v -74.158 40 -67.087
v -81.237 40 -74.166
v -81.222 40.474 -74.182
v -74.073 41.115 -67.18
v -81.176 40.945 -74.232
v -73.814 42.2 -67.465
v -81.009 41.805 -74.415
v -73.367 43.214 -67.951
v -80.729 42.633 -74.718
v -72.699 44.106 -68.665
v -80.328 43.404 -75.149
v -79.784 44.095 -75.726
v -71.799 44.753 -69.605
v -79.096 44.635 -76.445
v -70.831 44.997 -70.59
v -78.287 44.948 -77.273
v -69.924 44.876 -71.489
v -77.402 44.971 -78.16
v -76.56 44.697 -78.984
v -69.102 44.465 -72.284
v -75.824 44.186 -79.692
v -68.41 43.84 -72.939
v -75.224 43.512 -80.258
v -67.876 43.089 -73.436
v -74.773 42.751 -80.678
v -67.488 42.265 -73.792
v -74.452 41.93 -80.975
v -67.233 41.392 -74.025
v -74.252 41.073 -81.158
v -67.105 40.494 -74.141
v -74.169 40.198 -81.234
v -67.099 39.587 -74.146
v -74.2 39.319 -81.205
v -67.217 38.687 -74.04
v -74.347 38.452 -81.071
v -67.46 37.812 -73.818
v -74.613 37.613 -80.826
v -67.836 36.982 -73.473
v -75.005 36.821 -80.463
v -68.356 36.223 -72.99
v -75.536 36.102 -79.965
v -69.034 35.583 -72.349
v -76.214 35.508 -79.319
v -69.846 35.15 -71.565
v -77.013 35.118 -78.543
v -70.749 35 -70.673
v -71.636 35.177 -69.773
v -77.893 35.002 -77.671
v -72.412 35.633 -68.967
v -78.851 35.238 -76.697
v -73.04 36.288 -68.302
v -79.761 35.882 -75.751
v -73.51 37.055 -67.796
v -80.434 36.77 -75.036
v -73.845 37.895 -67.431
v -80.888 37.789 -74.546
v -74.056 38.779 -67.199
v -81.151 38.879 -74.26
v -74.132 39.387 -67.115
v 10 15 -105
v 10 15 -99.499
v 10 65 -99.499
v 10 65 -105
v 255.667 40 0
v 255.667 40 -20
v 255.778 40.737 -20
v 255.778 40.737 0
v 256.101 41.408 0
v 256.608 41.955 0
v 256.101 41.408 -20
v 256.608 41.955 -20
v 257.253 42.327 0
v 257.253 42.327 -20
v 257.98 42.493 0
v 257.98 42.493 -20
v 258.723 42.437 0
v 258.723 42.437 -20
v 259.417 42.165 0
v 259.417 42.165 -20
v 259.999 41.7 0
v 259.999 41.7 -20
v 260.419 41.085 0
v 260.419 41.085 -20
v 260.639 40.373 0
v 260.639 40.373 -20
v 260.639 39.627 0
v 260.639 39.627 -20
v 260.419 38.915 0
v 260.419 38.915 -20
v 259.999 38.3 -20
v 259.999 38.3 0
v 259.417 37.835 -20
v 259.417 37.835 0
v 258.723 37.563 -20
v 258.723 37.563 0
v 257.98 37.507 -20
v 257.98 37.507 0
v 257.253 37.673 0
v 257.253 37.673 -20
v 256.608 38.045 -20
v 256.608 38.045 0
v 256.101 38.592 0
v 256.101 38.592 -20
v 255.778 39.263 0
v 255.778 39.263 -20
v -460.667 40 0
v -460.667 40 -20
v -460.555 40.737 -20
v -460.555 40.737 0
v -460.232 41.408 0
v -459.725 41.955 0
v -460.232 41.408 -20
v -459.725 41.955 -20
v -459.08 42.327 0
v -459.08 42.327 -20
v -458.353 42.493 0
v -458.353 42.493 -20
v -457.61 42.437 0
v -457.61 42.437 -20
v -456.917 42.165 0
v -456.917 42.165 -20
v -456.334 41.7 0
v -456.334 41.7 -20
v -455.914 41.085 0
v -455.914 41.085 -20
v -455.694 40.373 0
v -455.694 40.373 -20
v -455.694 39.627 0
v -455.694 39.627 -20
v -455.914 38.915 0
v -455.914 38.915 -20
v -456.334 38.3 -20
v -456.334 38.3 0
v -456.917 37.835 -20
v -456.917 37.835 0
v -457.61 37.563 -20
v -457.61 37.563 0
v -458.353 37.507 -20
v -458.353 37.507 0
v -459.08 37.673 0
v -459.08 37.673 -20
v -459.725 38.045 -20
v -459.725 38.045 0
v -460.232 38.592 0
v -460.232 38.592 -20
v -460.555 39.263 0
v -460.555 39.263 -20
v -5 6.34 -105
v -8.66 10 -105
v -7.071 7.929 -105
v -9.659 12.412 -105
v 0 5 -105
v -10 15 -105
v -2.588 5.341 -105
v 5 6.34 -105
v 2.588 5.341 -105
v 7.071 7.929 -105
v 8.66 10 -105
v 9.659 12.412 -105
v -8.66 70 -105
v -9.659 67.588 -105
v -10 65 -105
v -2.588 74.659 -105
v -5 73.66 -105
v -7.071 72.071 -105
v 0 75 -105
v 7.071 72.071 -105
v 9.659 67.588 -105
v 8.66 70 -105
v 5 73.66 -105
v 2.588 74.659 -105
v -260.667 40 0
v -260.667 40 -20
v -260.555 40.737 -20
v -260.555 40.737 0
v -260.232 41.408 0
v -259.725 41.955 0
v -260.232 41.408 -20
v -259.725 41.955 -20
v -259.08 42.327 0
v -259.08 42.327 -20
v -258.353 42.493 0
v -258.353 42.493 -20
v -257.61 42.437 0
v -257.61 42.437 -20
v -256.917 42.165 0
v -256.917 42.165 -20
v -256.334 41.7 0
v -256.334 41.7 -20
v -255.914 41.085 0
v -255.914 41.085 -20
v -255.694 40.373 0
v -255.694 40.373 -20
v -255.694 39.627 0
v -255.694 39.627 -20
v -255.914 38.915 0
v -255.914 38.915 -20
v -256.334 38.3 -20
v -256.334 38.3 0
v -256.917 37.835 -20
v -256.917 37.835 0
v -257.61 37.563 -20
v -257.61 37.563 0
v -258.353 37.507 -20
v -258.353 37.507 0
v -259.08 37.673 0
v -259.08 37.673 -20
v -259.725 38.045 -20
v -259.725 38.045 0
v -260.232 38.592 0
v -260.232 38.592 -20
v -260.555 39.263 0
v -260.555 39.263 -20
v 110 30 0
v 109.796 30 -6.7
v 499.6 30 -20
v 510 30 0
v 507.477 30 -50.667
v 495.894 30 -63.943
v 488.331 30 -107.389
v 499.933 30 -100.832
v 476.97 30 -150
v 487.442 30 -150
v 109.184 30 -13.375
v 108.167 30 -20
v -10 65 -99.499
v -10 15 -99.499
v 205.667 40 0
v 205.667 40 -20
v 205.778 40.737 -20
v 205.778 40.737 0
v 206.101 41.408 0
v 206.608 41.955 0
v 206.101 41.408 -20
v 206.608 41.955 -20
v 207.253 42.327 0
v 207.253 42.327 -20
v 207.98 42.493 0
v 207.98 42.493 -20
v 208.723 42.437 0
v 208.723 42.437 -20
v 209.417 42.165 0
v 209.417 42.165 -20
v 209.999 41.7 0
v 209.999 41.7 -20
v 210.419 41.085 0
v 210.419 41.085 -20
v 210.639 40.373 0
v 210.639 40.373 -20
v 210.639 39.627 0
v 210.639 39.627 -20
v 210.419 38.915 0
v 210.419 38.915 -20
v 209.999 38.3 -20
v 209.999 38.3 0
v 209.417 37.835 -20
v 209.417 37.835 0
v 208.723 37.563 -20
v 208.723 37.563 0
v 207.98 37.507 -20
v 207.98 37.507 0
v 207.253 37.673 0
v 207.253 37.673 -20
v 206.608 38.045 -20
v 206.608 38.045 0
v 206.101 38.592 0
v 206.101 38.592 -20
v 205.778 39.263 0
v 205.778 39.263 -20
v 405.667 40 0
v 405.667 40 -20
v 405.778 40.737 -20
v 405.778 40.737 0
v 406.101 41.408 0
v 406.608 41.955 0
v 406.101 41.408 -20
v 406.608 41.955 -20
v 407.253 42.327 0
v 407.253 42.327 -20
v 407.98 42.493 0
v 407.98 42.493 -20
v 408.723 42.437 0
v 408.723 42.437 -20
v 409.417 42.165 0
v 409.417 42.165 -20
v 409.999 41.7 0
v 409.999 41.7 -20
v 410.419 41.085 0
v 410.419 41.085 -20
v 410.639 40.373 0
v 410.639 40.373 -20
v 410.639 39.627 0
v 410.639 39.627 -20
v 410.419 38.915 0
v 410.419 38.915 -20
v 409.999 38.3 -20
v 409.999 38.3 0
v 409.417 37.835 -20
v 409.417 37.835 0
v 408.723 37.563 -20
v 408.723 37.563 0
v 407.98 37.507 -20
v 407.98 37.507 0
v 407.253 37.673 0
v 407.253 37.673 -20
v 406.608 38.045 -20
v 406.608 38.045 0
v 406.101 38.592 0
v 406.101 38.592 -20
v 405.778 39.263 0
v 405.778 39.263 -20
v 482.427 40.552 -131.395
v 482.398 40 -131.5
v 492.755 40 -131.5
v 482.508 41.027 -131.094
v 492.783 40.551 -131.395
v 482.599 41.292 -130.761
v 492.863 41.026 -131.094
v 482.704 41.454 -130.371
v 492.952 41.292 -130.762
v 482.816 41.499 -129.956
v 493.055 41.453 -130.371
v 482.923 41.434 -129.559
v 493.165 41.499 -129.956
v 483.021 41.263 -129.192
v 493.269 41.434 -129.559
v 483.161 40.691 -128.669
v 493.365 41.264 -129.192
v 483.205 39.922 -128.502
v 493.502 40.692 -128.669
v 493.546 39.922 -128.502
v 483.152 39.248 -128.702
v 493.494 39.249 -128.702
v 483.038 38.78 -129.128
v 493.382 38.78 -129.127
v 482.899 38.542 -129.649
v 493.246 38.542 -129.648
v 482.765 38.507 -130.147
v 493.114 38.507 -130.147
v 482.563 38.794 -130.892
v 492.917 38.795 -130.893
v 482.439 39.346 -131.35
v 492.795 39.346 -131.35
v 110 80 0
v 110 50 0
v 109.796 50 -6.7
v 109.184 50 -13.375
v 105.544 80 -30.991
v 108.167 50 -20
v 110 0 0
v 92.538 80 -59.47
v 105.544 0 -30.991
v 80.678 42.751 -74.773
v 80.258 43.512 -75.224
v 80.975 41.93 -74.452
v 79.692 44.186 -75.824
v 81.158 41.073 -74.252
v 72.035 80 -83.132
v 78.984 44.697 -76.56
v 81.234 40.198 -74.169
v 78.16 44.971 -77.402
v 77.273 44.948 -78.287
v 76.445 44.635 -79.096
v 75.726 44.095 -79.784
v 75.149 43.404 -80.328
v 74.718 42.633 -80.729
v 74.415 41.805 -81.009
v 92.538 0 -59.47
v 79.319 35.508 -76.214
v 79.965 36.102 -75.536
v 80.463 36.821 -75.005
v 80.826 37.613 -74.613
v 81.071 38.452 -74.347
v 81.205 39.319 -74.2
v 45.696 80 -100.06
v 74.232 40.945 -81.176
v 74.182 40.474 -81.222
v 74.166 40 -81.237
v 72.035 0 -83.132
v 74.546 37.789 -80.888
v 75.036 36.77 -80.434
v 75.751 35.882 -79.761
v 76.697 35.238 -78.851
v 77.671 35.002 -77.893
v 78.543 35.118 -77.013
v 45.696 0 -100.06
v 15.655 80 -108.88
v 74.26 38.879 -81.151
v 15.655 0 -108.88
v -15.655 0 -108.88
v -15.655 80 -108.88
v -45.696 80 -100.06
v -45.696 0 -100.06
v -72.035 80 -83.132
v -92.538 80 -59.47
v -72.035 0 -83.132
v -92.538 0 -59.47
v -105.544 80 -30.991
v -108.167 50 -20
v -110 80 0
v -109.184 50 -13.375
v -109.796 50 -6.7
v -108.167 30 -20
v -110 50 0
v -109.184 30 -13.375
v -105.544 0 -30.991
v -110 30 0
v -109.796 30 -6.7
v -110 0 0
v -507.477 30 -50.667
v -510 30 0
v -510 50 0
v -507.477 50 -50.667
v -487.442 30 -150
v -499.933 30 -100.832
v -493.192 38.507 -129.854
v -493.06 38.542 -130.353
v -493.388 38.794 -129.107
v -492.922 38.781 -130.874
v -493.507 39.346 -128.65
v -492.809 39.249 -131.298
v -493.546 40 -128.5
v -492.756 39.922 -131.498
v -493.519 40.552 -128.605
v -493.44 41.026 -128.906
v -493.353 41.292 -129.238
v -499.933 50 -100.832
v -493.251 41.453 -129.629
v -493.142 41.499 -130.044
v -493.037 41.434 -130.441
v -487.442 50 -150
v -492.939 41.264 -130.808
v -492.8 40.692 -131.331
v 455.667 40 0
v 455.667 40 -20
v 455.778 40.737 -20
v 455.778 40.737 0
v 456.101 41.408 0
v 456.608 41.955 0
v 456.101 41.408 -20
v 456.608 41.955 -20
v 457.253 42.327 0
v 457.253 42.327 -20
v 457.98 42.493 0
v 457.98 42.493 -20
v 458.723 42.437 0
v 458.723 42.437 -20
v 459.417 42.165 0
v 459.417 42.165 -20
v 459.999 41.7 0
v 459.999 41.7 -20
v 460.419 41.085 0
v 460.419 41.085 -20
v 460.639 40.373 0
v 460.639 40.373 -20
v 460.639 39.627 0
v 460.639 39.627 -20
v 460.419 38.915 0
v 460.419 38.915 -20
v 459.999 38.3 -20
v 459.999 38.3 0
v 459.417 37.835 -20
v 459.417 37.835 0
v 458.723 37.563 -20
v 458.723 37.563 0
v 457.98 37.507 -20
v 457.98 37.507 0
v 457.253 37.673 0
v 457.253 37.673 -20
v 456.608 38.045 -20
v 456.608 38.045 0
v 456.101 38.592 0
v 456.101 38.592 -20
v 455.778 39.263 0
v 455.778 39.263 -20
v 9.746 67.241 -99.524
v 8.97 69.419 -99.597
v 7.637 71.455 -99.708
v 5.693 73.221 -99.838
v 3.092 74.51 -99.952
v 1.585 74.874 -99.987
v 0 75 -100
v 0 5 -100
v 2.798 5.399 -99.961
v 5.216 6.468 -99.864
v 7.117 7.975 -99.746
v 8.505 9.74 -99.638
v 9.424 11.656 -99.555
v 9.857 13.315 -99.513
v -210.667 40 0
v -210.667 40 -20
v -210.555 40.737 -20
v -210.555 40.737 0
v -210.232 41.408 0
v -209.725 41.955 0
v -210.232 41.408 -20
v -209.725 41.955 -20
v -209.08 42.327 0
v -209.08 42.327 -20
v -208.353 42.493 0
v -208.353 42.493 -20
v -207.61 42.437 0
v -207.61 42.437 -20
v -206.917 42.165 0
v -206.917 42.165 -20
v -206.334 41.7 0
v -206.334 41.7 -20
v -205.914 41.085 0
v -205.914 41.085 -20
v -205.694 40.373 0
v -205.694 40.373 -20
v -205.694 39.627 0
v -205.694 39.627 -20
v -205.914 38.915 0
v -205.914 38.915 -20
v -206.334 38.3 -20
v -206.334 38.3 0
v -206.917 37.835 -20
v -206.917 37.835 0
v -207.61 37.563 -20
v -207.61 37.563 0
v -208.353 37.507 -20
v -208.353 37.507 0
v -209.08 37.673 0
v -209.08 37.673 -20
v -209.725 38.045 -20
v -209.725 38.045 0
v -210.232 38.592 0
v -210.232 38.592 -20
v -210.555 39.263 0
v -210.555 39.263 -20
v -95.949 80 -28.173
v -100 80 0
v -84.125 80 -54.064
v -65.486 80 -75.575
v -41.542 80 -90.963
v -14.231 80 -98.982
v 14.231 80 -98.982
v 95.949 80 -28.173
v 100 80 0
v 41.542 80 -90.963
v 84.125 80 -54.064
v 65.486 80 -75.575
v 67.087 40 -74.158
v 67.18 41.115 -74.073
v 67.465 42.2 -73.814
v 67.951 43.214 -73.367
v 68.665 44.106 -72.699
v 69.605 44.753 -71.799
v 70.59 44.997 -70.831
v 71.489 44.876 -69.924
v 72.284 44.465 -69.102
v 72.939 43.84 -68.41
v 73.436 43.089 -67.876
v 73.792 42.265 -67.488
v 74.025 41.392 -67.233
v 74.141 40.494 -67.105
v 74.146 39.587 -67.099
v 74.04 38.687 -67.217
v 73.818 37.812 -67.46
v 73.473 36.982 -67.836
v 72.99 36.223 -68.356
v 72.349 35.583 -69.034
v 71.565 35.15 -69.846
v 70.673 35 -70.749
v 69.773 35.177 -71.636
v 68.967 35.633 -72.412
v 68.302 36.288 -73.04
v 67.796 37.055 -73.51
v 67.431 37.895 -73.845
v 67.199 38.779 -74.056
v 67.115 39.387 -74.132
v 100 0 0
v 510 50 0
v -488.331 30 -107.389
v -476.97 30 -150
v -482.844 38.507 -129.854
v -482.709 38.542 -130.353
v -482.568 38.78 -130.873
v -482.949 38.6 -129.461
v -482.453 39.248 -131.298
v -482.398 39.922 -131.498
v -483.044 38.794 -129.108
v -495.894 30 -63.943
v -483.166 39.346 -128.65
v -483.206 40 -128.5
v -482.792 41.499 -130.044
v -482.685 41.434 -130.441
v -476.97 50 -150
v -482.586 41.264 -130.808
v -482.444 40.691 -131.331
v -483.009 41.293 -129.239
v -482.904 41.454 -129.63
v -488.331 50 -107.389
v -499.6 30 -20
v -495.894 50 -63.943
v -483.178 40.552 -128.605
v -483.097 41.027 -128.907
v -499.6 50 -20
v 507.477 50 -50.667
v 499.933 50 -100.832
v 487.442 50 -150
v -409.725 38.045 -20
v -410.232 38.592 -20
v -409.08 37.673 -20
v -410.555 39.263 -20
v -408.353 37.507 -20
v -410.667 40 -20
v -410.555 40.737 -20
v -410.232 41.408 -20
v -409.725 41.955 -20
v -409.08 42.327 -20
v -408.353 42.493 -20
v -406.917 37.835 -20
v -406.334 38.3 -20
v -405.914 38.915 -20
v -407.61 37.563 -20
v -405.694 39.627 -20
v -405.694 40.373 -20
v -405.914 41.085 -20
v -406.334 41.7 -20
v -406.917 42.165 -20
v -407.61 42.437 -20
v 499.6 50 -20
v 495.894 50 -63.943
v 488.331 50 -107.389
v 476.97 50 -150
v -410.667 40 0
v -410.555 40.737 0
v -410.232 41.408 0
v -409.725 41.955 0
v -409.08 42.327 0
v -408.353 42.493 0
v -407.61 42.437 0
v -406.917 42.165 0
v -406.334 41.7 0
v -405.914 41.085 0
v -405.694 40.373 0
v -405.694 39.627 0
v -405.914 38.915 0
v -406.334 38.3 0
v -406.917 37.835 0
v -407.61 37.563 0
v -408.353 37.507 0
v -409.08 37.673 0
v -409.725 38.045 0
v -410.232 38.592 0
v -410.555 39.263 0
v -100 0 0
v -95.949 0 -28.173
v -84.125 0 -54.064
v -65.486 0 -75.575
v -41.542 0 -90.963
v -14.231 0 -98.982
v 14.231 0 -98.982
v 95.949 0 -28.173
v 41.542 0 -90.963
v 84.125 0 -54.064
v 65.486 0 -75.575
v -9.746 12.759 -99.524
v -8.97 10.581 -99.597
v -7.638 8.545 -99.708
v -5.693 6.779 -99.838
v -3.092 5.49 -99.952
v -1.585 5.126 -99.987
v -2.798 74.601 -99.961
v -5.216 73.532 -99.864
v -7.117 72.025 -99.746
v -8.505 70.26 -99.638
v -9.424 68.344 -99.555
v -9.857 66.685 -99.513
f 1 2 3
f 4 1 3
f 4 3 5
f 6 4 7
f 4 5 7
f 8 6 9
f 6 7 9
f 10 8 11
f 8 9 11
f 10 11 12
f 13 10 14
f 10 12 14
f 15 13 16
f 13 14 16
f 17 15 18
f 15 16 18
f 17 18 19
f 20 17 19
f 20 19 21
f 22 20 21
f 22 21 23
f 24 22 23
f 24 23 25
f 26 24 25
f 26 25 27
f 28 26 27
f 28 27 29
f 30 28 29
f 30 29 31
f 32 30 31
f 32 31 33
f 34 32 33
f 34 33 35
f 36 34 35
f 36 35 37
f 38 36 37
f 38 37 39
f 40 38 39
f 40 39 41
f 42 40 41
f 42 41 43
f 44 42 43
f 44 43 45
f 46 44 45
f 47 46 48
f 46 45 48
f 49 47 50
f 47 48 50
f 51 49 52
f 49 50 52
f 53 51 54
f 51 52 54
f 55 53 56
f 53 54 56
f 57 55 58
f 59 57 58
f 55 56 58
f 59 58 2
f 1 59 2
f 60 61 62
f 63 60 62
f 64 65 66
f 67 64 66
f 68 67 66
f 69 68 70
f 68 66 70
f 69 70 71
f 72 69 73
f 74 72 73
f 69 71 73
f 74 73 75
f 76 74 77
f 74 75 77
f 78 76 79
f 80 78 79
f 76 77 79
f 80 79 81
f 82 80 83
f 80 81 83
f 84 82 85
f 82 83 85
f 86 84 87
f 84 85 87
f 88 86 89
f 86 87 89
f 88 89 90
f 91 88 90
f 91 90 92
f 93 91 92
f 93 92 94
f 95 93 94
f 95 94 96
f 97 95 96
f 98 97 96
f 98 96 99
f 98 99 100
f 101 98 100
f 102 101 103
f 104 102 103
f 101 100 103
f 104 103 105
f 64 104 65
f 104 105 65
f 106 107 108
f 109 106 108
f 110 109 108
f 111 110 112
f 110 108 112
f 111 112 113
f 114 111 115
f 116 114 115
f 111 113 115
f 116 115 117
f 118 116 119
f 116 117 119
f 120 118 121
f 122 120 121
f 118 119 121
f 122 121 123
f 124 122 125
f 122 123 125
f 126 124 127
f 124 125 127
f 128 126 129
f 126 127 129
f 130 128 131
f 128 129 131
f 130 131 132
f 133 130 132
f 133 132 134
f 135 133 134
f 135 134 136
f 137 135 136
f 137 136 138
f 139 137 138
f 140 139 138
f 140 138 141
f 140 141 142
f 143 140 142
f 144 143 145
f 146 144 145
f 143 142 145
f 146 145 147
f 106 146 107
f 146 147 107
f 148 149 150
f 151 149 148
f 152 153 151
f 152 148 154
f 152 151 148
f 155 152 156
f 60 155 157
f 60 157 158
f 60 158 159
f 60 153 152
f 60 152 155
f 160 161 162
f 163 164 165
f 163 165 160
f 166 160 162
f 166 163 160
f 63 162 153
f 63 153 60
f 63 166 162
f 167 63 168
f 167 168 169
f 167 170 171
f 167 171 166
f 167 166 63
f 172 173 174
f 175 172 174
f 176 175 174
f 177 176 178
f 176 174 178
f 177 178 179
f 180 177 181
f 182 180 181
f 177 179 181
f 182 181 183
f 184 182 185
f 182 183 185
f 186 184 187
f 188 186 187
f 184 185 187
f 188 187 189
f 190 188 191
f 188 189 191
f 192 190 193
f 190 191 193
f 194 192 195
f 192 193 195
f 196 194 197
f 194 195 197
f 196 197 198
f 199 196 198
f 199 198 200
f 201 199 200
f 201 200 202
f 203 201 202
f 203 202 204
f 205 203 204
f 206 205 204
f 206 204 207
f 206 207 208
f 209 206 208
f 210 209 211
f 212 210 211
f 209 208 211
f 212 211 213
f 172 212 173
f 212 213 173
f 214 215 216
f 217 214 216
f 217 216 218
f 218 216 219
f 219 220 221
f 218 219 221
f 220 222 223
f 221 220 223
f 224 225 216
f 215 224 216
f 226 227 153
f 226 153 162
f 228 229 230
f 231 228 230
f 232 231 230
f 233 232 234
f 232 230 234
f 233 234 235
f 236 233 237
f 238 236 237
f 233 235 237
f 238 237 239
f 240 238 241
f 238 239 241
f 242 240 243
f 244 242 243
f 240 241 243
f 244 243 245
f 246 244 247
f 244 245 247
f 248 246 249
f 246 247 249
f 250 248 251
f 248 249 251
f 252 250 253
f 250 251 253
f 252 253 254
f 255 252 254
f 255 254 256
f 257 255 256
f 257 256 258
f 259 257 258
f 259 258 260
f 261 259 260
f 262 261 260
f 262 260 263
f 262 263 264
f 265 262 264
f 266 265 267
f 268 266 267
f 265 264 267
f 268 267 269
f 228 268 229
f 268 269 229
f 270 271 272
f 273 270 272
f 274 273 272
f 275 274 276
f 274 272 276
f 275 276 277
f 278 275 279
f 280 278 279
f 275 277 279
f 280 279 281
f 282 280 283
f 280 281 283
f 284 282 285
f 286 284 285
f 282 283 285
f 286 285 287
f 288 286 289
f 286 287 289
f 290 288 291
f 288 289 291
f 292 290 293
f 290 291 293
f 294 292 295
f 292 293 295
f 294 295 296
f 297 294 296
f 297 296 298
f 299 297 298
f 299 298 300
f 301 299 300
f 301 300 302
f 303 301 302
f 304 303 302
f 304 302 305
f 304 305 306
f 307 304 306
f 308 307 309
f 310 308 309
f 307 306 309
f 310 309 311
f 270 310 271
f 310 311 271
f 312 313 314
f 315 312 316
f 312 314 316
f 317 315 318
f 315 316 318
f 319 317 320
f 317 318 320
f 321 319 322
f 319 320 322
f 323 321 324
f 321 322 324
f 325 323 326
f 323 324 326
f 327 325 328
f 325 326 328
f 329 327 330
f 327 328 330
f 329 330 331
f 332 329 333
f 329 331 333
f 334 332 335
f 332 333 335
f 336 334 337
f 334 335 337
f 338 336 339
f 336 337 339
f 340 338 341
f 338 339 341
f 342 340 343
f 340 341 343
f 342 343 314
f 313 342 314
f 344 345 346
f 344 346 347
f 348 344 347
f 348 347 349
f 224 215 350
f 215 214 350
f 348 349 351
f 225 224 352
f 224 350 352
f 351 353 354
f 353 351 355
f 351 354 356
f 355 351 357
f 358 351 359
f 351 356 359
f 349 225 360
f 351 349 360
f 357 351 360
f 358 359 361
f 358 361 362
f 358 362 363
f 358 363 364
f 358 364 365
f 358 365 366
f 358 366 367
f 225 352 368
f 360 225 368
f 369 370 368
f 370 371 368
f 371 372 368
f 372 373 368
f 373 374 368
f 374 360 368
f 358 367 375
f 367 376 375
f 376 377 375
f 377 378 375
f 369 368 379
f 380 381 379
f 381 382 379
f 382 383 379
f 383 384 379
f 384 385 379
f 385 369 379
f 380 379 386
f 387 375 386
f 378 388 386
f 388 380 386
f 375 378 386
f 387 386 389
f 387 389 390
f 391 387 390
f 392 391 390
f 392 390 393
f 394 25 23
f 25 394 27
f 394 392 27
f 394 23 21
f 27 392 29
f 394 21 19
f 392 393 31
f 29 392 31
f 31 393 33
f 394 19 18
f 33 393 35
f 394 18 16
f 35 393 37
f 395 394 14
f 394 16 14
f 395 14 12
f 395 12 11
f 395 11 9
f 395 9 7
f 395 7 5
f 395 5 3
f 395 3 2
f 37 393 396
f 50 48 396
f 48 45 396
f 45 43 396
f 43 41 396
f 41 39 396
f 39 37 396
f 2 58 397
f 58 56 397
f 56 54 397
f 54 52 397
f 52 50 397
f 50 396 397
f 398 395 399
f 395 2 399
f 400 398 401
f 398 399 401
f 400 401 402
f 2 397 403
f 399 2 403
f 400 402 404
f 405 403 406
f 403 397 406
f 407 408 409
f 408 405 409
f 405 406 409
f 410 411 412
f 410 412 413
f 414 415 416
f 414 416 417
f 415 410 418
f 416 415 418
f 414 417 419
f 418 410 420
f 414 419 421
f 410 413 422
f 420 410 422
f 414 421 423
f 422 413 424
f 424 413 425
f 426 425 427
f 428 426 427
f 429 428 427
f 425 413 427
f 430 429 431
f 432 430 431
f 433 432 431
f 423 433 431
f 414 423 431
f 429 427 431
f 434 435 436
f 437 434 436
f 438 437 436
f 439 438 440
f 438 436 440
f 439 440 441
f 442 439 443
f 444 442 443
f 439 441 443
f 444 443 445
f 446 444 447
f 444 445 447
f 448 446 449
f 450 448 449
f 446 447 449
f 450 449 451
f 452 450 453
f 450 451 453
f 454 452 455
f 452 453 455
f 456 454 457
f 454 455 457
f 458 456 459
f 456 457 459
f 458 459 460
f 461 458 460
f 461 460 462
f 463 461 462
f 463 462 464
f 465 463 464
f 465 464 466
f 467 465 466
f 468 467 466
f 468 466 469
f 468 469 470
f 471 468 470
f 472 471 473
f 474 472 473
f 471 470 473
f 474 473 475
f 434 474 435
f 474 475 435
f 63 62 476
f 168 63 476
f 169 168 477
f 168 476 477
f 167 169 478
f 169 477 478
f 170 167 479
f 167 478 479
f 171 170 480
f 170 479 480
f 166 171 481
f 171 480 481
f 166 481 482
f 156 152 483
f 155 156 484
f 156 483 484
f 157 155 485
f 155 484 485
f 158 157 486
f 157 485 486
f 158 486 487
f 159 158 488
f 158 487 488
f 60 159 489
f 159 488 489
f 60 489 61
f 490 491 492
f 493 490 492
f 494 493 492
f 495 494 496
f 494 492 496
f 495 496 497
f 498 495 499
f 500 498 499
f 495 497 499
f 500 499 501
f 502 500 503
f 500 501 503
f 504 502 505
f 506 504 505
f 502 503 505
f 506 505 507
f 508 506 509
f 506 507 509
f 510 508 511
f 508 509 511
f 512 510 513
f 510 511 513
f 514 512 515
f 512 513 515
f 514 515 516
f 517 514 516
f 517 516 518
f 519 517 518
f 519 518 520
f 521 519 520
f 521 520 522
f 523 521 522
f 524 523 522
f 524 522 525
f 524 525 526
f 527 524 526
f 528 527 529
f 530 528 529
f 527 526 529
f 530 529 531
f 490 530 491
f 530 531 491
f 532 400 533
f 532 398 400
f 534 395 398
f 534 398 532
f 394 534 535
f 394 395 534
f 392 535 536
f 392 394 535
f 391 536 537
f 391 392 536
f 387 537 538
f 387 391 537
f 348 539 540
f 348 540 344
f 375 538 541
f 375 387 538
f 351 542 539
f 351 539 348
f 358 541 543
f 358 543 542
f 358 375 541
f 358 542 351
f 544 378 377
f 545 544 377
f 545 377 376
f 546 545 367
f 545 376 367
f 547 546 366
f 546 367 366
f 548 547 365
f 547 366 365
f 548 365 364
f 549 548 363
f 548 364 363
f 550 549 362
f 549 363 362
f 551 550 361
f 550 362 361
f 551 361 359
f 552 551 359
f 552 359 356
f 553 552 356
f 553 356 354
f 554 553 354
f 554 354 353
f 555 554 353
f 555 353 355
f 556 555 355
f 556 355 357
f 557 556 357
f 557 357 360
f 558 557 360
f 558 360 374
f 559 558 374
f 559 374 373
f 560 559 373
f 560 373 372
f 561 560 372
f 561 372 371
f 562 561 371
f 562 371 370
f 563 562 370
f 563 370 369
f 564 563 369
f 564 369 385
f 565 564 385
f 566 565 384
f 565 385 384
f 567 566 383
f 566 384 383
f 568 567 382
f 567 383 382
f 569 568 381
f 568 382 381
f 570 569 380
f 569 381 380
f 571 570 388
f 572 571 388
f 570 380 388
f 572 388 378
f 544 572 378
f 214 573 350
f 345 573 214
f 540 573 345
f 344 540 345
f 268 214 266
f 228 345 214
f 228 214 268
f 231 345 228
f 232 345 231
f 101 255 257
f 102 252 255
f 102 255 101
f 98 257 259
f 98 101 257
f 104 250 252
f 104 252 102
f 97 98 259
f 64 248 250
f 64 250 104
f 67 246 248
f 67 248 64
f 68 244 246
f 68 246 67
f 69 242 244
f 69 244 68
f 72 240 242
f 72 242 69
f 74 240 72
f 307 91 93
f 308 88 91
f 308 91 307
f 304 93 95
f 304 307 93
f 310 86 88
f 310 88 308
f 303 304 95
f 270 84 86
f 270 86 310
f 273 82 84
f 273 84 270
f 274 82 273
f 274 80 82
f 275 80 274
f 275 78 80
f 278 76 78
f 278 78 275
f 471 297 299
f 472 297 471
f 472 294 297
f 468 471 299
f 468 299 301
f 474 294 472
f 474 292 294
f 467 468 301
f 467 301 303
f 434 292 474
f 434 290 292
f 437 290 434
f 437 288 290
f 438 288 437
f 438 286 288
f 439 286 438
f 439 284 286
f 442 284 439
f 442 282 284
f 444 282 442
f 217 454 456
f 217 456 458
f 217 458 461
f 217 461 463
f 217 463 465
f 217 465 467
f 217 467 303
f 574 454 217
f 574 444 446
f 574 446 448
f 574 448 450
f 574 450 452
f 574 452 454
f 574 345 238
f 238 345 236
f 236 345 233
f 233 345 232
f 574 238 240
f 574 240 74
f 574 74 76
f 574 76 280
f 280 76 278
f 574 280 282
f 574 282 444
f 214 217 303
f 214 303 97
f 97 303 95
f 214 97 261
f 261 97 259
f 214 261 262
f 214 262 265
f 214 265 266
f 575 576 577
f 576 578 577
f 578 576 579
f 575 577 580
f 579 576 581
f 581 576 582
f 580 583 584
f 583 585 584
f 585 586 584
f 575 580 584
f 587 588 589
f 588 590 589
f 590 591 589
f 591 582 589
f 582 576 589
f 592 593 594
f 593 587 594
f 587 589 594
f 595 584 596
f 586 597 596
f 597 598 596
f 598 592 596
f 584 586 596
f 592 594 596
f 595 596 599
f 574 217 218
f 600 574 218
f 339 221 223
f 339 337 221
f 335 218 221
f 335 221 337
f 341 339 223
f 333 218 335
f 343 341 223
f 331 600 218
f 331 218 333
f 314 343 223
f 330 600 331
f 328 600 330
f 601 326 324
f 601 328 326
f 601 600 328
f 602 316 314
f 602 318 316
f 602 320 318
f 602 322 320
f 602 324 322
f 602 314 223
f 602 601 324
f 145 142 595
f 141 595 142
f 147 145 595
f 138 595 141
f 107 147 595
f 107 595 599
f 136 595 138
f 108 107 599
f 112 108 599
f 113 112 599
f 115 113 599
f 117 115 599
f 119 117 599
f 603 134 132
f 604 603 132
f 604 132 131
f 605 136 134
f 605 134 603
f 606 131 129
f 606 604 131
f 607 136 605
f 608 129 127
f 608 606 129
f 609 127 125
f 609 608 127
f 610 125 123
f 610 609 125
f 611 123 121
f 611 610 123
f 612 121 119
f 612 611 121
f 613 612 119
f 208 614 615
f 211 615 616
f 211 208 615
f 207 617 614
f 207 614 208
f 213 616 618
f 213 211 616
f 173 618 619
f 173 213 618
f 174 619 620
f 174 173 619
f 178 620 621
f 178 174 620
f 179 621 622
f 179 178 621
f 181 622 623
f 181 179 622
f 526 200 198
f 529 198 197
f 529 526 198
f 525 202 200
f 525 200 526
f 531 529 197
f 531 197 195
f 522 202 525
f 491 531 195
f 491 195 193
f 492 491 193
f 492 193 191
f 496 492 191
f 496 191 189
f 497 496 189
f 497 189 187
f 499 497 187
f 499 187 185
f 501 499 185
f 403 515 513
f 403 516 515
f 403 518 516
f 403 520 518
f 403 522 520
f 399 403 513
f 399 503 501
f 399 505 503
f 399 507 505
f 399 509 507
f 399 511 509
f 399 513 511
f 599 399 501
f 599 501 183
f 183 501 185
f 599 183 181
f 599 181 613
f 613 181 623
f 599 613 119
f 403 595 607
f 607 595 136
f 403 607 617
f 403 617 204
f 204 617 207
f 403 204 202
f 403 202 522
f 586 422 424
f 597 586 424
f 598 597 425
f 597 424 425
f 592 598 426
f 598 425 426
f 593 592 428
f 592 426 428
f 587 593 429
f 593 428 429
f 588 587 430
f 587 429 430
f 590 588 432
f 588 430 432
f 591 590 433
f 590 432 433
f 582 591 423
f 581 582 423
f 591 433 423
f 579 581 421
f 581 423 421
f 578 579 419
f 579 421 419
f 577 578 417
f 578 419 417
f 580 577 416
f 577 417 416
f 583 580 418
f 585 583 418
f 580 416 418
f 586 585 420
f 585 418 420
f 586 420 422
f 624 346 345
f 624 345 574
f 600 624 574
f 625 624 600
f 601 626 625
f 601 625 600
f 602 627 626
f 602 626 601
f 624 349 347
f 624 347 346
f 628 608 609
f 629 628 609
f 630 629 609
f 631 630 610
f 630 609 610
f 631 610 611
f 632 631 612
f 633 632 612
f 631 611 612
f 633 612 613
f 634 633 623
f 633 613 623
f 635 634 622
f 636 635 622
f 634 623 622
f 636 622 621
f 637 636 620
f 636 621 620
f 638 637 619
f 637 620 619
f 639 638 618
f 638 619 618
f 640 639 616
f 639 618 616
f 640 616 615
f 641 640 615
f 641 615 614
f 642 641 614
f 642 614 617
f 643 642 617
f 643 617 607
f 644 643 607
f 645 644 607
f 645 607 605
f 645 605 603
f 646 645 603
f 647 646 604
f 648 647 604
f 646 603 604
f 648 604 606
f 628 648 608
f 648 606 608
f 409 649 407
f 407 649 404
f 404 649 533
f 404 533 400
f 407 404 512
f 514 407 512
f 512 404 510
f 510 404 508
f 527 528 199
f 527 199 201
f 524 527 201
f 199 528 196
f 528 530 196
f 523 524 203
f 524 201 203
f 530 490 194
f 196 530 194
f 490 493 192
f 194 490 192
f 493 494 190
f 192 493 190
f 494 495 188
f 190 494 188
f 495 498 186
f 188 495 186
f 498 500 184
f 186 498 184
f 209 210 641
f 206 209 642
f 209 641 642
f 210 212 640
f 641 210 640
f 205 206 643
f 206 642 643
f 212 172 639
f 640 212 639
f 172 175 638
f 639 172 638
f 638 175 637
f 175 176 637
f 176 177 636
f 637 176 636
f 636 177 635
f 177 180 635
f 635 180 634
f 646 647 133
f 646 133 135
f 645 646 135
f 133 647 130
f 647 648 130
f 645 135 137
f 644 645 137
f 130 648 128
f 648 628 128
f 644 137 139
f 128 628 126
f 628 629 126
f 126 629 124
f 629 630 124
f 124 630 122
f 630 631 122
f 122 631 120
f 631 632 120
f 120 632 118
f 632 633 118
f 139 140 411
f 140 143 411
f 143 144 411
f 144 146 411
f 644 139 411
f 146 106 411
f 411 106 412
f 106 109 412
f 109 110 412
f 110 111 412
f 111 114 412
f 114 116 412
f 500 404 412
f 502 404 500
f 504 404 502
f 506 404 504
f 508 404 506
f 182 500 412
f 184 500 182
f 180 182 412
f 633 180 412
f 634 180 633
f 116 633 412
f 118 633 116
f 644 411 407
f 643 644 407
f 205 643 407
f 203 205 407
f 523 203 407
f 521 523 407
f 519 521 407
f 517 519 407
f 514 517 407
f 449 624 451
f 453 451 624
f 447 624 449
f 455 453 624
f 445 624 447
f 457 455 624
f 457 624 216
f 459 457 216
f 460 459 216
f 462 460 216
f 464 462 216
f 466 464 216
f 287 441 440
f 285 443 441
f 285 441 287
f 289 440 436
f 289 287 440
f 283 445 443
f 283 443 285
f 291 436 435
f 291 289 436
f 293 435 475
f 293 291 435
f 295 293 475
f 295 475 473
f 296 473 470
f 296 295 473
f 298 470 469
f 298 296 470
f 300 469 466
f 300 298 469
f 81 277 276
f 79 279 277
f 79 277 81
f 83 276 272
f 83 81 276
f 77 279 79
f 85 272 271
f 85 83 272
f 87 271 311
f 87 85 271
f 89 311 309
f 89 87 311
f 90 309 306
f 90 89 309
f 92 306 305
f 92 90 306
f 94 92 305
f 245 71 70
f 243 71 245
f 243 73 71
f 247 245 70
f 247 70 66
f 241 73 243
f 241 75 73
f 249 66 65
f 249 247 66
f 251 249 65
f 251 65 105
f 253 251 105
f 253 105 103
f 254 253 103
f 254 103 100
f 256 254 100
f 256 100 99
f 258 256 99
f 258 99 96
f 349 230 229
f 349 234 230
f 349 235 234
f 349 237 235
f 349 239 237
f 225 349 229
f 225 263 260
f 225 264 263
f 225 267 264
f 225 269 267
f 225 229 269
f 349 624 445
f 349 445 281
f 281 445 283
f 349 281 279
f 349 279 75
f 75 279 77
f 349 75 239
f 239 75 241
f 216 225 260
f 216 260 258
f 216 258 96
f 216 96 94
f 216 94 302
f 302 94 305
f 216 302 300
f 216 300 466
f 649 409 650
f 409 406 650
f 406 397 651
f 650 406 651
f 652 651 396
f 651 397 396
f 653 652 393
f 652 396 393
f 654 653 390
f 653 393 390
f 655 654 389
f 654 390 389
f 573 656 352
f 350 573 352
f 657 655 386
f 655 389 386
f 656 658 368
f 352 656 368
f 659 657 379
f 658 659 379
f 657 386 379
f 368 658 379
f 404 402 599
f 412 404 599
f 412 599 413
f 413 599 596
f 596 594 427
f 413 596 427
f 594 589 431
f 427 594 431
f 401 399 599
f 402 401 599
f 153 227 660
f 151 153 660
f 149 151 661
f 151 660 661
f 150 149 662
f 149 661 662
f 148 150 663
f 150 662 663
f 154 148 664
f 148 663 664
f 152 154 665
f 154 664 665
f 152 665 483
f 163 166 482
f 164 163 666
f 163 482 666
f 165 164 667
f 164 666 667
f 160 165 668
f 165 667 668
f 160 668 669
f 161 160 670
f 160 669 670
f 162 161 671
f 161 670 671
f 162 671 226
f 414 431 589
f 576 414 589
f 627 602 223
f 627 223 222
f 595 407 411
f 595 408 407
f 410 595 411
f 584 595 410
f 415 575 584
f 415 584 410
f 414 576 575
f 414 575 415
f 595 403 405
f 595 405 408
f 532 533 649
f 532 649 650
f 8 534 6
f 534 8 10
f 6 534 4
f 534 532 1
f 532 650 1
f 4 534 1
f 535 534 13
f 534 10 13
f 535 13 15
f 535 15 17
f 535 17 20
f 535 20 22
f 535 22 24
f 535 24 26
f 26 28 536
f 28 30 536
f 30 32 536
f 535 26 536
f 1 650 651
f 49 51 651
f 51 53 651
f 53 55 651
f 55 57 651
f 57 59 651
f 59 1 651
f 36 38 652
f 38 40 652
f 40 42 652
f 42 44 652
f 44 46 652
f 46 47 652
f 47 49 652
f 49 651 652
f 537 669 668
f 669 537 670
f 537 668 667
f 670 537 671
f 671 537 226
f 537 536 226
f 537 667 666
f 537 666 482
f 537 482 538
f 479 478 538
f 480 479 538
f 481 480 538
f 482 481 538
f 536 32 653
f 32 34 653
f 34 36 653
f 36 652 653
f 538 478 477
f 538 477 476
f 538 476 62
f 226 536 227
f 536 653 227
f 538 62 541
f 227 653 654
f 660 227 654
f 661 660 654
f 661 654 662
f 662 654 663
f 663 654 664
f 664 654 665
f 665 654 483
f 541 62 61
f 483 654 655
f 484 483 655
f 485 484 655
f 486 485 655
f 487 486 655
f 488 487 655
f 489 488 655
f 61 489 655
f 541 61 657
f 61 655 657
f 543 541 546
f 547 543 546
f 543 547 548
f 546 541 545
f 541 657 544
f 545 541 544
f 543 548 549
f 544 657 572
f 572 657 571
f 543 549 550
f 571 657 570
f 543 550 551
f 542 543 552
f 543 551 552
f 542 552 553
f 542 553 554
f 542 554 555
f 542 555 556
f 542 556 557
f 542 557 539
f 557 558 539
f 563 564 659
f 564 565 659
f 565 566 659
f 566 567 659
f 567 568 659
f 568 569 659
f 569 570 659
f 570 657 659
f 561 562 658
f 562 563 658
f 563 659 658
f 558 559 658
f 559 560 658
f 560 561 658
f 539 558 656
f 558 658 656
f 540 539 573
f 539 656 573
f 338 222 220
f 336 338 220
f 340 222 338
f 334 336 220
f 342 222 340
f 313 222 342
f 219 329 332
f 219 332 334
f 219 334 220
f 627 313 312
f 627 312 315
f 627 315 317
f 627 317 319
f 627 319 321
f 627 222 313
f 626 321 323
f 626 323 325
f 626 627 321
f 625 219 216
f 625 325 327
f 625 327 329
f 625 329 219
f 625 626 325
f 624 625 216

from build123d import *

# Parameters (mm, degrees)
BOSS_EXTRUDE1_DEPTH = 80
SKETCH2_W           = 20
SKETCH2_H           = 10
BOSS_EXTRUDE2_DEPTH = 400
SKETCH3_W           = 20
SKETCH3_H           = 20
BOSS_EXTRUDE3_DEPTH = 400
BOSS_EXTRUDE4_DEPTH = 20
BOSS_EXTRUDE5_DEPTH = 20
SKETCH10_R          = 2.5
CUT_EXTRUDE1_DEPTH  = 20
SKETCH11_R          = 5
CUT_EXTRUDE3_DEPTH  = 20
SKETCH12_R          = 5
CUT_EXTRUDE4_DEPTH  = 20
SKETCH15_W          = 10
SKETCH15_H          = 50
CUT_EXTRUDE7_DEPTH  = 15
SKETCH16_R          = 1.5
CUT_EXTRUDE8_DEPTH  = 50
SKETCH17_R          = 1.5
CUT_EXTRUDE9_DEPTH  = 50


with BuildPart() as part:
    # Sketch1 → Boss-Extrude1 (new body)
    with BuildSketch(Plane(origin=(0, 0, 0), x_dir=(1, 0, 0), z_dir=(0, 1, 0))):
        with BuildLine():
            Line((-110, 0), (-100, 0))
            ThreePointArc((-100, 0), (0, 100), (100, 0))
            Line((100, 0), (110, 0))
            ThreePointArc((110, 0), (0, 110), (-110, 0))
        make_face()
    extrude(amount=BOSS_EXTRUDE1_DEPTH)

    # Sketch2 → Boss-Extrude2 (add)
    with BuildSketch(Plane(origin=(100, 80, 0), x_dir=(0, 0, 1), z_dir=(-1, 0, 0))):
        with Locations((-10, -35)):
            Rectangle(SKETCH2_W, SKETCH2_H)
        with Locations((-10, -45)):
            Rectangle(SKETCH2_W, SKETCH2_H)
    extrude(amount=-BOSS_EXTRUDE2_DEPTH)

    # Sketch3 → Boss-Extrude3 (add)
    with BuildSketch(Plane(origin=(-100, 80, 0), x_dir=(0, 0, -1), z_dir=(1, 0, 0))):
        with Locations((10, -40)):
            Rectangle(SKETCH3_W, SKETCH3_H)
    extrude(amount=-BOSS_EXTRUDE3_DEPTH)

    # Sketch5 → Boss-Extrude4 (add)
    with BuildSketch(Plane(origin=(0, 50, 0), x_dir=(1, 0, 0), z_dir=(0, 1, 0))):
        with BuildLine():
            Line((500, 0), (510, 0))
            ThreePointArc((510, 0), (504.329046943, 75.843341231), (487.442304278, 150))
            Line((487.442304278, 150), (476.969600708, 150))
            ThreePointArc((476.969600708, 150), (494.208862908, 75.878849641), (500, 0))
        make_face()
    extrude(amount=-BOSS_EXTRUDE4_DEPTH)

    # Sketch7 → Boss-Extrude5 (add)
    with BuildSketch(Plane(origin=(0, 50, 0), x_dir=(1, 0, 0), z_dir=(0, 1, 0))):
        with BuildLine():
            ThreePointArc((-510, 0), (-504.329046943, 75.843341231), (-487.442304278, 150))
            Line((-487.442304278, 150), (-476.969600708, 150))
            ThreePointArc((-476.969600708, 150), (-494.208862908, 75.878849641), (-500, 0))
            Line((-500, 0), (-510, 0))
        make_face()
    extrude(amount=-BOSS_EXTRUDE5_DEPTH)

    # Sketch10 → Cut-Extrude1 (cut)
    with BuildSketch(Plane(origin=(0, 0, -20), x_dir=(-1, 0, 0), z_dir=(0, 0, -1))):
        with Locations((-258.166538264, 40)):
            Circle(SKETCH10_R)
        with Locations((-408.166538264, 40)):
            Circle(SKETCH10_R)
        with Locations((258.166538264, 40)):
            Circle(SKETCH10_R)
        with Locations((408.166538264, 40)):
            Circle(SKETCH10_R)
        with Locations((-458.166538264, 40)):
            Circle(SKETCH10_R)
        with Locations((-208.166538264, 40)):
            Circle(SKETCH10_R)
        with Locations((208.166538264, 40)):
            Circle(SKETCH10_R)
        with Locations((458.166538264, 40)):
            Circle(SKETCH10_R)
    extrude(amount=-CUT_EXTRUDE1_DEPTH, mode=Mode.SUBTRACT)

    # Sketch11 → Cut-Extrude3 (cut)
    with BuildSketch(Plane(origin=(-77.781745931, 0, -77.781745931), x_dir=(-0.707106781, 0, 0.707106781), z_dir=(-0.707106781, 0, -0.707106781))):
        with Locations((0, 40)):
            Circle(SKETCH11_R)
    extrude(amount=-CUT_EXTRUDE3_DEPTH, mode=Mode.SUBTRACT)

    # Sketch12 → Cut-Extrude4 (cut)
    with BuildSketch(Plane(origin=(77.781745931, 0, -77.781745931), x_dir=(-0.707106781, 0, -0.707106781), z_dir=(0.707106781, 0, -0.707106781))):
        with Locations((0, 40)):
            Circle(SKETCH12_R)
    extrude(amount=-CUT_EXTRUDE4_DEPTH, mode=Mode.SUBTRACT)

    # Sketch15 → Cut-Extrude7 (cut)
    with BuildSketch(Plane.XY.offset(-90)):
        with BuildLine():
            ThreePointArc((-10, 15), (-7.071067812, 7.928932188), (0, 5))
            Line((0, 5), (0, 15))
            Line((0, 15), (-10, 15))
        make_face()
        with BuildLine():
            Line((0, 15), (0, 5))
            ThreePointArc((0, 5), (7.071067812, 7.928932188), (10, 15))
            Line((10, 15), (0, 15))
        make_face()
        with Locations((5, 40)):
            Rectangle(SKETCH15_W, SKETCH15_H)
        with Locations((-5, 40)):
            Rectangle(SKETCH15_W, SKETCH15_H)
        with BuildLine():
            Line((-10, 65), (0, 65))
            Line((0, 65), (0, 75))
            ThreePointArc((0, 75), (-7.071067812, 72.071067812), (-10, 65))
        make_face()
        with BuildLine():
            Line((0, 75), (0, 65))
            Line((0, 65), (10, 65))
            ThreePointArc((10, 65), (7.071067812, 72.071067812), (0, 75))
        make_face()
    extrude(amount=-CUT_EXTRUDE7_DEPTH, mode=Mode.SUBTRACT)

    # Sketch16 → Cut-Extrude8 (cut)
    with BuildSketch(Plane(origin=(-510, 30, 0), x_dir=(0, 0, 1), z_dir=(-1, 0, 0))):
        with Locations((-130, 10)):
            Circle(SKETCH16_R)
    extrude(amount=-CUT_EXTRUDE8_DEPTH, mode=Mode.SUBTRACT)

    # Sketch17 → Cut-Extrude9 (cut)
    with BuildSketch(Plane(origin=(510, 30, 0), x_dir=(0, 0, -1), z_dir=(1, 0, 0))):
        with Locations((130, 10)):
            Circle(SKETCH17_R)
    extrude(amount=-CUT_EXTRUDE9_DEPTH, mode=Mode.SUBTRACT)


solid = part.part
